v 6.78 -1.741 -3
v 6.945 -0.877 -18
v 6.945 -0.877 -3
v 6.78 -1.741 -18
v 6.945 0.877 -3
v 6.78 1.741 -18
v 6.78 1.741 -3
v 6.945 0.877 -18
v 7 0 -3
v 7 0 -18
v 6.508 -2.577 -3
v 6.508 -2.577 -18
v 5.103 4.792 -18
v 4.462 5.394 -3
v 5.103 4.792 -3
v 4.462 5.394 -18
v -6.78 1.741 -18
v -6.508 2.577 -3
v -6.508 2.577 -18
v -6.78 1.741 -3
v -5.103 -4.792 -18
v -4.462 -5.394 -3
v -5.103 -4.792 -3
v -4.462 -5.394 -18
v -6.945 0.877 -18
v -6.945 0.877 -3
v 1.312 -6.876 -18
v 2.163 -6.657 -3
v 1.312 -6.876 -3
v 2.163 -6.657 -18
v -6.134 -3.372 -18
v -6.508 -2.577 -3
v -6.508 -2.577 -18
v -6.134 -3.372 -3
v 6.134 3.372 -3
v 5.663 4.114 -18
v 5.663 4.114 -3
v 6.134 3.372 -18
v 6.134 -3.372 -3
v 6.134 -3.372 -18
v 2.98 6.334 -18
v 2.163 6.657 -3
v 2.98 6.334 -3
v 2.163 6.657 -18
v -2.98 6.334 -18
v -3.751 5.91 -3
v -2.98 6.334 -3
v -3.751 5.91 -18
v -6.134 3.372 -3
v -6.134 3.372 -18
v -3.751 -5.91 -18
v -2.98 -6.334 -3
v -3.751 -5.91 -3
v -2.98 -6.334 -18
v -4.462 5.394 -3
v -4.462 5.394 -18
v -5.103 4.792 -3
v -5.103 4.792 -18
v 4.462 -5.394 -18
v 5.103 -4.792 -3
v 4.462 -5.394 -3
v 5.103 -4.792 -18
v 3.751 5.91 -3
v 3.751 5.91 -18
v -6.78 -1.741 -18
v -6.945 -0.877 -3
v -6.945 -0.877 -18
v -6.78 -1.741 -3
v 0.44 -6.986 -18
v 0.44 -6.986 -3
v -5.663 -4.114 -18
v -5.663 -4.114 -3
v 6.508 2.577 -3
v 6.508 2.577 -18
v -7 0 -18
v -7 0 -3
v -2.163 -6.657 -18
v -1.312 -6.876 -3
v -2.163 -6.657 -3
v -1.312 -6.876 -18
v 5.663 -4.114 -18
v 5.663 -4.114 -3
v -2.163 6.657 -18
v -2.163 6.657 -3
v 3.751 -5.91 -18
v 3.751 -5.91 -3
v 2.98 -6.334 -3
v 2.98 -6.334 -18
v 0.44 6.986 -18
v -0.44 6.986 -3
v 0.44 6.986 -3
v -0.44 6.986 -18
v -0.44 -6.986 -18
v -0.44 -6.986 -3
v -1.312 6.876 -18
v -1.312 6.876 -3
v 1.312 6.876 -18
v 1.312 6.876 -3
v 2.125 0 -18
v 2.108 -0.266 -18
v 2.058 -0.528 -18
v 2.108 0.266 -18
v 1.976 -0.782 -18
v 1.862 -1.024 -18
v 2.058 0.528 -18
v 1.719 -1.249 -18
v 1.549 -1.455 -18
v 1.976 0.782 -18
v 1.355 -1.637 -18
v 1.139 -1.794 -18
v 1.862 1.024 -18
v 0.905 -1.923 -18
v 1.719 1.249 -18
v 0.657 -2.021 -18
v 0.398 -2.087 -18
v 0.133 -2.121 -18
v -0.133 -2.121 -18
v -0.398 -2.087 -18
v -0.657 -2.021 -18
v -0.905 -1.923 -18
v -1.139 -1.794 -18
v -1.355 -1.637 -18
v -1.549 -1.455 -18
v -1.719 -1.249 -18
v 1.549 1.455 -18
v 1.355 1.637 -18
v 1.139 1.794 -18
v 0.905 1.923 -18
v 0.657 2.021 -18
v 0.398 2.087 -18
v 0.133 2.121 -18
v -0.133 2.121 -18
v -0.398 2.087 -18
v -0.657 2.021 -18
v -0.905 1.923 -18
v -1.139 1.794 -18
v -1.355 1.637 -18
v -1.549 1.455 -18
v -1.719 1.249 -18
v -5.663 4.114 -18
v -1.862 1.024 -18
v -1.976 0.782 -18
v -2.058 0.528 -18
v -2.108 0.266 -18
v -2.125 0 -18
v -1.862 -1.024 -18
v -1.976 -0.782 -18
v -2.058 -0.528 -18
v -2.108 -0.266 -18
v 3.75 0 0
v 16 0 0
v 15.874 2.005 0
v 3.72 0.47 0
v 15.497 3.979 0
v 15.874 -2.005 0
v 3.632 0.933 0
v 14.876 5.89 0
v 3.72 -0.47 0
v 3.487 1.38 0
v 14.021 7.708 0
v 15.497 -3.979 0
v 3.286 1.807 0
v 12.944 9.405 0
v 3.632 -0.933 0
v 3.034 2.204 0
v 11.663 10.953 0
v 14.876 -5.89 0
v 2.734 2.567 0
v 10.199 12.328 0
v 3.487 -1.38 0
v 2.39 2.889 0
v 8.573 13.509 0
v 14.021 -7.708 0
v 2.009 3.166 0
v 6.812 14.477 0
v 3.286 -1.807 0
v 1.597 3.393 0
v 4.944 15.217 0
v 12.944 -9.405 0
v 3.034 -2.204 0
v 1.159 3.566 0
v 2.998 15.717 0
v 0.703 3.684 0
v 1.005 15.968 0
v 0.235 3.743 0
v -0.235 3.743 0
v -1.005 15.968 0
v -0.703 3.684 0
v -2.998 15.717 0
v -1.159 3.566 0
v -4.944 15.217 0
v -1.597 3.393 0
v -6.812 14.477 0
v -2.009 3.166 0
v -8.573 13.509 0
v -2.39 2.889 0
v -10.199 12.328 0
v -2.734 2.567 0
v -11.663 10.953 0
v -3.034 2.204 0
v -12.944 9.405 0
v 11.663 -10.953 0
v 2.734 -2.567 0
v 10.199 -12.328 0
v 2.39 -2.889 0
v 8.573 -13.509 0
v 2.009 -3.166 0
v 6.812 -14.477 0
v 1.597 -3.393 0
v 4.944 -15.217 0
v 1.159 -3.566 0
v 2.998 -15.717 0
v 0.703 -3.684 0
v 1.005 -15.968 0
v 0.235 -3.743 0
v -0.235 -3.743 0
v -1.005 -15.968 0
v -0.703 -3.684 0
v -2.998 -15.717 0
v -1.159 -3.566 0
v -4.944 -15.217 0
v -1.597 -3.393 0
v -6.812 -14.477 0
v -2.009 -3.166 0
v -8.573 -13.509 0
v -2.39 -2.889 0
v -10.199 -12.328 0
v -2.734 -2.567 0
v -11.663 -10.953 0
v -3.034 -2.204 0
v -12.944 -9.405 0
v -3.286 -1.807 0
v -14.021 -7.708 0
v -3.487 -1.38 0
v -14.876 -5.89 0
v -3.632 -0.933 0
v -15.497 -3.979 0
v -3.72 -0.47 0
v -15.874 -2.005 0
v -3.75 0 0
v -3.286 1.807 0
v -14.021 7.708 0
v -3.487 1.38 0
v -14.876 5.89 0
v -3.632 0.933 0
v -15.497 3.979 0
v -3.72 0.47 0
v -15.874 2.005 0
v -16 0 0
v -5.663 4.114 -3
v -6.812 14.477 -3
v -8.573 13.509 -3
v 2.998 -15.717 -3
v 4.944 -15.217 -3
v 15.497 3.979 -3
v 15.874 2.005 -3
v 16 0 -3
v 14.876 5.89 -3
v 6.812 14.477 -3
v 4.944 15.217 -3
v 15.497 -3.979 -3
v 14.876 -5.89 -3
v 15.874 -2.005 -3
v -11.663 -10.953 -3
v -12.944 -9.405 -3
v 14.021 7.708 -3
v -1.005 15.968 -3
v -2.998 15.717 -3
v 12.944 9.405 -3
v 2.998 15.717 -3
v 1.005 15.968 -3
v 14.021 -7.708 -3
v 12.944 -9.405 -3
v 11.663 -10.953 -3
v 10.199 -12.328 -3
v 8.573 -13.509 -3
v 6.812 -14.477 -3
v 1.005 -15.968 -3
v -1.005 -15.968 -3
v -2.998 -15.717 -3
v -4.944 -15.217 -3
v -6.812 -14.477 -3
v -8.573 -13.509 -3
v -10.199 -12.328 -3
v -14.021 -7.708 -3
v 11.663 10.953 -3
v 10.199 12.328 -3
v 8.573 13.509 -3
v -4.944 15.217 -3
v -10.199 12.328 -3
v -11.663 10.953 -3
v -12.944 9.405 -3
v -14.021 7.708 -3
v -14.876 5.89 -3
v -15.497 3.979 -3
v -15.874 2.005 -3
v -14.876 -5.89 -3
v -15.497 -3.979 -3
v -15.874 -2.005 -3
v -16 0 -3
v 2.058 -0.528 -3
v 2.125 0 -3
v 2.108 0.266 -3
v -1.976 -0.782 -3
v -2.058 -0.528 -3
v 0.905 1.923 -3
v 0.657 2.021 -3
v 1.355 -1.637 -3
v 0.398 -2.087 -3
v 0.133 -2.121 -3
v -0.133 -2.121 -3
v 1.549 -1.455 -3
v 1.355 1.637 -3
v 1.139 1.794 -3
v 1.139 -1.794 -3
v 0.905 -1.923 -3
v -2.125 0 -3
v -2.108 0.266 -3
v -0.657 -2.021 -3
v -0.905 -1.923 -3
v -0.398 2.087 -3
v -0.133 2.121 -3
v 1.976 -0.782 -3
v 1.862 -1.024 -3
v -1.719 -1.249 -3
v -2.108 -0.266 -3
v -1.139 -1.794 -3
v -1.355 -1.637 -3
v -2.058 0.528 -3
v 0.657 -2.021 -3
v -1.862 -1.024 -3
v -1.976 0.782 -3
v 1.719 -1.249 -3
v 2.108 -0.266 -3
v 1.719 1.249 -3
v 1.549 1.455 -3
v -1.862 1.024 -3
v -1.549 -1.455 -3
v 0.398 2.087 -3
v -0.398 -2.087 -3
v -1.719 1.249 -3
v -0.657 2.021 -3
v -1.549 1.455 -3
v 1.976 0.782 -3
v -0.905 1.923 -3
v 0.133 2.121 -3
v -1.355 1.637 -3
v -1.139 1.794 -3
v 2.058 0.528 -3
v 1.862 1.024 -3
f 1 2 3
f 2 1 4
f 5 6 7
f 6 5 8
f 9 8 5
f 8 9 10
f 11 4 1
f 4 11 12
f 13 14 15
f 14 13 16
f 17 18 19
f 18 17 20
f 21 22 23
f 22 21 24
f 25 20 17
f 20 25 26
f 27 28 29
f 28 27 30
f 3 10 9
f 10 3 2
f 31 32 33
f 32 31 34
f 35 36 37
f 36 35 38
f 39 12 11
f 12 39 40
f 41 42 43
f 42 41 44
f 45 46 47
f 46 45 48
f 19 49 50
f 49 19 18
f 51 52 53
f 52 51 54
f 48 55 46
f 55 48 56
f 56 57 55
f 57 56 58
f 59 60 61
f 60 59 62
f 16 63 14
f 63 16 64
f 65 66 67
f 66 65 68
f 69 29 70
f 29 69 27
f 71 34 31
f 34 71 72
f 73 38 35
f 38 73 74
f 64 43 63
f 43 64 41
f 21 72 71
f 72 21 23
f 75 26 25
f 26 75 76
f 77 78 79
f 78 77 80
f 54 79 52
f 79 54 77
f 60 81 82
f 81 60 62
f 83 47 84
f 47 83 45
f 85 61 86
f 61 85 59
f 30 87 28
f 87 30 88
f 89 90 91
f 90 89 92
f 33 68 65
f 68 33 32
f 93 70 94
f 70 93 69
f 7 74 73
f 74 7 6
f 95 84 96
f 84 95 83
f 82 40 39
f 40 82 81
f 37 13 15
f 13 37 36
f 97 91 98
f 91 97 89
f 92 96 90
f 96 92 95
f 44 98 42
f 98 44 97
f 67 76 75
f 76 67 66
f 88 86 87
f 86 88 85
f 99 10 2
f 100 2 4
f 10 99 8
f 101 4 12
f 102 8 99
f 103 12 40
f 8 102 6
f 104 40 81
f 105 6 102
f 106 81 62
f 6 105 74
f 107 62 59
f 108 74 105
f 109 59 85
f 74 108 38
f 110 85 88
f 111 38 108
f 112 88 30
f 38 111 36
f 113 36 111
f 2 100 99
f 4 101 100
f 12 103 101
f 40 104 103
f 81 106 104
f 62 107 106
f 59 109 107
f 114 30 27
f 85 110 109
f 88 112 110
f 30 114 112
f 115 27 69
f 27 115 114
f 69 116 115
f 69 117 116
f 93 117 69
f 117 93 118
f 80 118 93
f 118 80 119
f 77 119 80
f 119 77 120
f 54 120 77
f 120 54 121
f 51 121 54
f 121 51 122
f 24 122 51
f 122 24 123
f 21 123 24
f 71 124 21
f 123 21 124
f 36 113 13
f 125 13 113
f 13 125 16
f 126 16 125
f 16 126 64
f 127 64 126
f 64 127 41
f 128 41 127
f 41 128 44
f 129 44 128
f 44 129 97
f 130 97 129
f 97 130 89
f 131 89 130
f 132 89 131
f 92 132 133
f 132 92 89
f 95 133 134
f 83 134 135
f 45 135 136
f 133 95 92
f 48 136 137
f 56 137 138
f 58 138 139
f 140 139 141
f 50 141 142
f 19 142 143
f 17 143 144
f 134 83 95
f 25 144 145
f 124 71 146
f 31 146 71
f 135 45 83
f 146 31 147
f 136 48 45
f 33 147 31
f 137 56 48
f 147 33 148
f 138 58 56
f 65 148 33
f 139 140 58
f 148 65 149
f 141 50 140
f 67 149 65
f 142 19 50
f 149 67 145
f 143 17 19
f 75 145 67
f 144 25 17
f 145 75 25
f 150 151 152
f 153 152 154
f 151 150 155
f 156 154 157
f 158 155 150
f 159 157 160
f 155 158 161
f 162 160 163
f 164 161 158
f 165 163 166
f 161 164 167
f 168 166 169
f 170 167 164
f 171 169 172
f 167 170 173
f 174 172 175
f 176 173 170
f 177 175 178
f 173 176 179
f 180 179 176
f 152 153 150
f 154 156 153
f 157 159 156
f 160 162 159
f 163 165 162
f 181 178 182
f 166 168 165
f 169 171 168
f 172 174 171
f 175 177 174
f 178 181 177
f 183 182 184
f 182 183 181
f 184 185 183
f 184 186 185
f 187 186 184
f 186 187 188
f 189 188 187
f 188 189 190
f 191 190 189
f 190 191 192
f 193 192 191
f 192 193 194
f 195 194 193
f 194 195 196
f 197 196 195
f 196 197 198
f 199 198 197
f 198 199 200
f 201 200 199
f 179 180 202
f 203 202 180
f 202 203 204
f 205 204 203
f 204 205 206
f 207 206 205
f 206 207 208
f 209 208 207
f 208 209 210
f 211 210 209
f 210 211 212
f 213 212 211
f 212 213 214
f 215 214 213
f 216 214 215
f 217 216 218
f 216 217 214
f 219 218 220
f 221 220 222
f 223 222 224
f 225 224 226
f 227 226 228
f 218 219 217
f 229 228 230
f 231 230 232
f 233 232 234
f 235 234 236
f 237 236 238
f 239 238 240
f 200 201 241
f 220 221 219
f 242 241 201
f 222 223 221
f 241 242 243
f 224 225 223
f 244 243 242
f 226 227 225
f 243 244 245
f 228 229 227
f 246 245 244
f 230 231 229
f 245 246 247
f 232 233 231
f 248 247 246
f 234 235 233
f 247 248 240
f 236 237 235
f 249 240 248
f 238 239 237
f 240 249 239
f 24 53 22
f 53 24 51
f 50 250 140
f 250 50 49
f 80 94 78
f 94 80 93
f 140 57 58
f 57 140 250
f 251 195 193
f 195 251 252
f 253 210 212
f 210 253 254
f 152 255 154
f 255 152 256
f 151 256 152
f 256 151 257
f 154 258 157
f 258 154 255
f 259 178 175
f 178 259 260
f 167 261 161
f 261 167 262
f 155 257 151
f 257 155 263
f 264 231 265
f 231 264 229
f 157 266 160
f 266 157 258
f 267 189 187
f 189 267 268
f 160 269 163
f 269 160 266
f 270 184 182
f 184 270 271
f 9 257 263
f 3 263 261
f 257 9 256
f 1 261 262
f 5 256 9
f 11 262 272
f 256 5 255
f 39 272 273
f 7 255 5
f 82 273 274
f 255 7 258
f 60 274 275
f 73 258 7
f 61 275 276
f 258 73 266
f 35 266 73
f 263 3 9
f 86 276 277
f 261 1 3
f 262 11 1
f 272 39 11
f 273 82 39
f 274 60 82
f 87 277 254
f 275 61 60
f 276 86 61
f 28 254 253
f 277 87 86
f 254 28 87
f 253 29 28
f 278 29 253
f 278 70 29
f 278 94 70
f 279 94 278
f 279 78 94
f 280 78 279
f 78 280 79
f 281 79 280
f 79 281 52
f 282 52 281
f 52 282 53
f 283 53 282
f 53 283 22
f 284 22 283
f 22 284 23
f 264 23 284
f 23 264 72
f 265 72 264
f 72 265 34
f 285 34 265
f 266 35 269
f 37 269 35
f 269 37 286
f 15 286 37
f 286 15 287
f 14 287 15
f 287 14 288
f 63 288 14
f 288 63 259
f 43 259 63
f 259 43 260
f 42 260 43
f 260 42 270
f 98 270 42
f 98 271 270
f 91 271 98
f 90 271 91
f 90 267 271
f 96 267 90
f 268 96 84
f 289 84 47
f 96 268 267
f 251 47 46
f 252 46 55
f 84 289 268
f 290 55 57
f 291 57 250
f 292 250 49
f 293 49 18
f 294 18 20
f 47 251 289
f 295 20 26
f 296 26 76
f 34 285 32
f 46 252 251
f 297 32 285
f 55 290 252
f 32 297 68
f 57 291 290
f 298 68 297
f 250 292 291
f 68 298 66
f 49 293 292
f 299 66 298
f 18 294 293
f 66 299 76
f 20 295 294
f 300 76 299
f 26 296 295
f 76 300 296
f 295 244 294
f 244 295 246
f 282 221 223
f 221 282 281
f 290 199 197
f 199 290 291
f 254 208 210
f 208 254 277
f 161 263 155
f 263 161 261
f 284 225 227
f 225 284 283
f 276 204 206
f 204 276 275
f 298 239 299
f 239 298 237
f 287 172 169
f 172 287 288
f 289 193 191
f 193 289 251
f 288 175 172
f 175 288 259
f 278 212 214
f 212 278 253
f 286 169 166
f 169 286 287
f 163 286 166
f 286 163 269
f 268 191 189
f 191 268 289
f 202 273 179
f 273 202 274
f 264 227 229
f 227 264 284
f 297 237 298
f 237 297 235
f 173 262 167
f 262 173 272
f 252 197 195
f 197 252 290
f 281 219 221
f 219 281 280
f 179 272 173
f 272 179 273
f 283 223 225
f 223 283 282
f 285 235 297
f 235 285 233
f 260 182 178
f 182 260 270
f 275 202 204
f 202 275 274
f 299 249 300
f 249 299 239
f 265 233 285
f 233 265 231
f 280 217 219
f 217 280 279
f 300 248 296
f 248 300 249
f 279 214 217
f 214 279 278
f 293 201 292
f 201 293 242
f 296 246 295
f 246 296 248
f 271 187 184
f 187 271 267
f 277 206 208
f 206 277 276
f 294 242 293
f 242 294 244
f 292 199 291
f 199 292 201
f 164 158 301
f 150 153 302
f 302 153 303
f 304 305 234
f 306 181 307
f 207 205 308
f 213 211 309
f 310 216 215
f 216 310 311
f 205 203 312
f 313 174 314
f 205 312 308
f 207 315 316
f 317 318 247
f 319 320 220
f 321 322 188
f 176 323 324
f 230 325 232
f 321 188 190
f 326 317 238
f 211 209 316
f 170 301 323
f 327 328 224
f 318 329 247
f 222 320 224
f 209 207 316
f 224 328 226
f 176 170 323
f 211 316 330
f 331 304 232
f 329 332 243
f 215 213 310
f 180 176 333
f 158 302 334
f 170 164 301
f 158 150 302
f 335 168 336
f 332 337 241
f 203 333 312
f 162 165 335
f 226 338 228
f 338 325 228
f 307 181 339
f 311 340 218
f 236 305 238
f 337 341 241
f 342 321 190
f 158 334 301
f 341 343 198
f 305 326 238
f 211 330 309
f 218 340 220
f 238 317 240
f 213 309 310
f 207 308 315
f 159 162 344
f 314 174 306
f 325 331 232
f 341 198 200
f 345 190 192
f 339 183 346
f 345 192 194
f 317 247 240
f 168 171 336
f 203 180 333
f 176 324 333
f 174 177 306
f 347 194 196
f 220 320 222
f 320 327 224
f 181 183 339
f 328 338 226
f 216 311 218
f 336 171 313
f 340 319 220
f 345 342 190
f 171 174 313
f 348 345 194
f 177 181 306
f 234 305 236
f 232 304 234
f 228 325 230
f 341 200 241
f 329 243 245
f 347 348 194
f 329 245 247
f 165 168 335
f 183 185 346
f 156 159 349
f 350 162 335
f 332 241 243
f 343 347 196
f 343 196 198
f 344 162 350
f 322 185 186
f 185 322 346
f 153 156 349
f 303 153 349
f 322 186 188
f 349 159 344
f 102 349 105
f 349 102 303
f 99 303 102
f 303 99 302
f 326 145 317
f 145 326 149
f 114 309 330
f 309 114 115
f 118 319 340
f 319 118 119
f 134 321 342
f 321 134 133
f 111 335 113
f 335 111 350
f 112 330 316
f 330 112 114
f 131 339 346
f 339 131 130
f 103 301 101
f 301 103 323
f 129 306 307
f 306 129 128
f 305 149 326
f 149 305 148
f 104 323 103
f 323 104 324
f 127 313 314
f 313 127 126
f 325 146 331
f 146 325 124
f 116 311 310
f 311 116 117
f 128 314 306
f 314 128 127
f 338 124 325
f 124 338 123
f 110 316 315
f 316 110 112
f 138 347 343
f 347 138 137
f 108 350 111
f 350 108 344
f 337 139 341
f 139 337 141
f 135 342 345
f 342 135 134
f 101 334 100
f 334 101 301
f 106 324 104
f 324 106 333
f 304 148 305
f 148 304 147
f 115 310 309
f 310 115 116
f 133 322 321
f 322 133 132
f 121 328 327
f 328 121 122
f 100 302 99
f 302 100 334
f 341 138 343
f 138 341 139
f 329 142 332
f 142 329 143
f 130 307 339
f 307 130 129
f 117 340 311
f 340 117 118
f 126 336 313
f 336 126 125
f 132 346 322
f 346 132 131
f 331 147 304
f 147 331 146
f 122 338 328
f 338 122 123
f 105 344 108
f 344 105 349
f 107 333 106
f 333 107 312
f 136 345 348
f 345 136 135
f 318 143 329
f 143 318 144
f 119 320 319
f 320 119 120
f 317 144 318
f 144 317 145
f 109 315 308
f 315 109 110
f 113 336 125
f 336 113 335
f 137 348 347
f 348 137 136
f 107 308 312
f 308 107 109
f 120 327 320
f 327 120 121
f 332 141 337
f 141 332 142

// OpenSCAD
$fn = 50;


difference() {
	union() {
		translate(v = [0, 0, -18.0000000000]) {
			cylinder(h = 18, r = 7.0000000000);
		}
		translate(v = [0, 0, -3.0000000000]) {
			cylinder(h = 3, r = 16.0000000000);
		}
	}
	union() {
		translate(v = [0, 0, 0]) {
			rotate(a = [0, 0, 0]) {
				difference() {
					union() {
						#translate(v = [0, 0, -18.0000000000]) {
							cylinder(h = 18, r = 2.0000000000);
						}
						#translate(v = [0, 0, -3]) {
							cylinder(h = 3, r1 = 2.1250000000, r2 = 3.7500000000);
						}
						#translate(v = [0, 0, -18.0000000000]) {
							cylinder(h = 18, r = 2.1250000000);
						}
						#translate(v = [0, 0, -18.0000000000]) {
							cylinder(h = 18, r = 2.0000000000);
						}
					}
					union();
				}
			}
		}
	}
}
